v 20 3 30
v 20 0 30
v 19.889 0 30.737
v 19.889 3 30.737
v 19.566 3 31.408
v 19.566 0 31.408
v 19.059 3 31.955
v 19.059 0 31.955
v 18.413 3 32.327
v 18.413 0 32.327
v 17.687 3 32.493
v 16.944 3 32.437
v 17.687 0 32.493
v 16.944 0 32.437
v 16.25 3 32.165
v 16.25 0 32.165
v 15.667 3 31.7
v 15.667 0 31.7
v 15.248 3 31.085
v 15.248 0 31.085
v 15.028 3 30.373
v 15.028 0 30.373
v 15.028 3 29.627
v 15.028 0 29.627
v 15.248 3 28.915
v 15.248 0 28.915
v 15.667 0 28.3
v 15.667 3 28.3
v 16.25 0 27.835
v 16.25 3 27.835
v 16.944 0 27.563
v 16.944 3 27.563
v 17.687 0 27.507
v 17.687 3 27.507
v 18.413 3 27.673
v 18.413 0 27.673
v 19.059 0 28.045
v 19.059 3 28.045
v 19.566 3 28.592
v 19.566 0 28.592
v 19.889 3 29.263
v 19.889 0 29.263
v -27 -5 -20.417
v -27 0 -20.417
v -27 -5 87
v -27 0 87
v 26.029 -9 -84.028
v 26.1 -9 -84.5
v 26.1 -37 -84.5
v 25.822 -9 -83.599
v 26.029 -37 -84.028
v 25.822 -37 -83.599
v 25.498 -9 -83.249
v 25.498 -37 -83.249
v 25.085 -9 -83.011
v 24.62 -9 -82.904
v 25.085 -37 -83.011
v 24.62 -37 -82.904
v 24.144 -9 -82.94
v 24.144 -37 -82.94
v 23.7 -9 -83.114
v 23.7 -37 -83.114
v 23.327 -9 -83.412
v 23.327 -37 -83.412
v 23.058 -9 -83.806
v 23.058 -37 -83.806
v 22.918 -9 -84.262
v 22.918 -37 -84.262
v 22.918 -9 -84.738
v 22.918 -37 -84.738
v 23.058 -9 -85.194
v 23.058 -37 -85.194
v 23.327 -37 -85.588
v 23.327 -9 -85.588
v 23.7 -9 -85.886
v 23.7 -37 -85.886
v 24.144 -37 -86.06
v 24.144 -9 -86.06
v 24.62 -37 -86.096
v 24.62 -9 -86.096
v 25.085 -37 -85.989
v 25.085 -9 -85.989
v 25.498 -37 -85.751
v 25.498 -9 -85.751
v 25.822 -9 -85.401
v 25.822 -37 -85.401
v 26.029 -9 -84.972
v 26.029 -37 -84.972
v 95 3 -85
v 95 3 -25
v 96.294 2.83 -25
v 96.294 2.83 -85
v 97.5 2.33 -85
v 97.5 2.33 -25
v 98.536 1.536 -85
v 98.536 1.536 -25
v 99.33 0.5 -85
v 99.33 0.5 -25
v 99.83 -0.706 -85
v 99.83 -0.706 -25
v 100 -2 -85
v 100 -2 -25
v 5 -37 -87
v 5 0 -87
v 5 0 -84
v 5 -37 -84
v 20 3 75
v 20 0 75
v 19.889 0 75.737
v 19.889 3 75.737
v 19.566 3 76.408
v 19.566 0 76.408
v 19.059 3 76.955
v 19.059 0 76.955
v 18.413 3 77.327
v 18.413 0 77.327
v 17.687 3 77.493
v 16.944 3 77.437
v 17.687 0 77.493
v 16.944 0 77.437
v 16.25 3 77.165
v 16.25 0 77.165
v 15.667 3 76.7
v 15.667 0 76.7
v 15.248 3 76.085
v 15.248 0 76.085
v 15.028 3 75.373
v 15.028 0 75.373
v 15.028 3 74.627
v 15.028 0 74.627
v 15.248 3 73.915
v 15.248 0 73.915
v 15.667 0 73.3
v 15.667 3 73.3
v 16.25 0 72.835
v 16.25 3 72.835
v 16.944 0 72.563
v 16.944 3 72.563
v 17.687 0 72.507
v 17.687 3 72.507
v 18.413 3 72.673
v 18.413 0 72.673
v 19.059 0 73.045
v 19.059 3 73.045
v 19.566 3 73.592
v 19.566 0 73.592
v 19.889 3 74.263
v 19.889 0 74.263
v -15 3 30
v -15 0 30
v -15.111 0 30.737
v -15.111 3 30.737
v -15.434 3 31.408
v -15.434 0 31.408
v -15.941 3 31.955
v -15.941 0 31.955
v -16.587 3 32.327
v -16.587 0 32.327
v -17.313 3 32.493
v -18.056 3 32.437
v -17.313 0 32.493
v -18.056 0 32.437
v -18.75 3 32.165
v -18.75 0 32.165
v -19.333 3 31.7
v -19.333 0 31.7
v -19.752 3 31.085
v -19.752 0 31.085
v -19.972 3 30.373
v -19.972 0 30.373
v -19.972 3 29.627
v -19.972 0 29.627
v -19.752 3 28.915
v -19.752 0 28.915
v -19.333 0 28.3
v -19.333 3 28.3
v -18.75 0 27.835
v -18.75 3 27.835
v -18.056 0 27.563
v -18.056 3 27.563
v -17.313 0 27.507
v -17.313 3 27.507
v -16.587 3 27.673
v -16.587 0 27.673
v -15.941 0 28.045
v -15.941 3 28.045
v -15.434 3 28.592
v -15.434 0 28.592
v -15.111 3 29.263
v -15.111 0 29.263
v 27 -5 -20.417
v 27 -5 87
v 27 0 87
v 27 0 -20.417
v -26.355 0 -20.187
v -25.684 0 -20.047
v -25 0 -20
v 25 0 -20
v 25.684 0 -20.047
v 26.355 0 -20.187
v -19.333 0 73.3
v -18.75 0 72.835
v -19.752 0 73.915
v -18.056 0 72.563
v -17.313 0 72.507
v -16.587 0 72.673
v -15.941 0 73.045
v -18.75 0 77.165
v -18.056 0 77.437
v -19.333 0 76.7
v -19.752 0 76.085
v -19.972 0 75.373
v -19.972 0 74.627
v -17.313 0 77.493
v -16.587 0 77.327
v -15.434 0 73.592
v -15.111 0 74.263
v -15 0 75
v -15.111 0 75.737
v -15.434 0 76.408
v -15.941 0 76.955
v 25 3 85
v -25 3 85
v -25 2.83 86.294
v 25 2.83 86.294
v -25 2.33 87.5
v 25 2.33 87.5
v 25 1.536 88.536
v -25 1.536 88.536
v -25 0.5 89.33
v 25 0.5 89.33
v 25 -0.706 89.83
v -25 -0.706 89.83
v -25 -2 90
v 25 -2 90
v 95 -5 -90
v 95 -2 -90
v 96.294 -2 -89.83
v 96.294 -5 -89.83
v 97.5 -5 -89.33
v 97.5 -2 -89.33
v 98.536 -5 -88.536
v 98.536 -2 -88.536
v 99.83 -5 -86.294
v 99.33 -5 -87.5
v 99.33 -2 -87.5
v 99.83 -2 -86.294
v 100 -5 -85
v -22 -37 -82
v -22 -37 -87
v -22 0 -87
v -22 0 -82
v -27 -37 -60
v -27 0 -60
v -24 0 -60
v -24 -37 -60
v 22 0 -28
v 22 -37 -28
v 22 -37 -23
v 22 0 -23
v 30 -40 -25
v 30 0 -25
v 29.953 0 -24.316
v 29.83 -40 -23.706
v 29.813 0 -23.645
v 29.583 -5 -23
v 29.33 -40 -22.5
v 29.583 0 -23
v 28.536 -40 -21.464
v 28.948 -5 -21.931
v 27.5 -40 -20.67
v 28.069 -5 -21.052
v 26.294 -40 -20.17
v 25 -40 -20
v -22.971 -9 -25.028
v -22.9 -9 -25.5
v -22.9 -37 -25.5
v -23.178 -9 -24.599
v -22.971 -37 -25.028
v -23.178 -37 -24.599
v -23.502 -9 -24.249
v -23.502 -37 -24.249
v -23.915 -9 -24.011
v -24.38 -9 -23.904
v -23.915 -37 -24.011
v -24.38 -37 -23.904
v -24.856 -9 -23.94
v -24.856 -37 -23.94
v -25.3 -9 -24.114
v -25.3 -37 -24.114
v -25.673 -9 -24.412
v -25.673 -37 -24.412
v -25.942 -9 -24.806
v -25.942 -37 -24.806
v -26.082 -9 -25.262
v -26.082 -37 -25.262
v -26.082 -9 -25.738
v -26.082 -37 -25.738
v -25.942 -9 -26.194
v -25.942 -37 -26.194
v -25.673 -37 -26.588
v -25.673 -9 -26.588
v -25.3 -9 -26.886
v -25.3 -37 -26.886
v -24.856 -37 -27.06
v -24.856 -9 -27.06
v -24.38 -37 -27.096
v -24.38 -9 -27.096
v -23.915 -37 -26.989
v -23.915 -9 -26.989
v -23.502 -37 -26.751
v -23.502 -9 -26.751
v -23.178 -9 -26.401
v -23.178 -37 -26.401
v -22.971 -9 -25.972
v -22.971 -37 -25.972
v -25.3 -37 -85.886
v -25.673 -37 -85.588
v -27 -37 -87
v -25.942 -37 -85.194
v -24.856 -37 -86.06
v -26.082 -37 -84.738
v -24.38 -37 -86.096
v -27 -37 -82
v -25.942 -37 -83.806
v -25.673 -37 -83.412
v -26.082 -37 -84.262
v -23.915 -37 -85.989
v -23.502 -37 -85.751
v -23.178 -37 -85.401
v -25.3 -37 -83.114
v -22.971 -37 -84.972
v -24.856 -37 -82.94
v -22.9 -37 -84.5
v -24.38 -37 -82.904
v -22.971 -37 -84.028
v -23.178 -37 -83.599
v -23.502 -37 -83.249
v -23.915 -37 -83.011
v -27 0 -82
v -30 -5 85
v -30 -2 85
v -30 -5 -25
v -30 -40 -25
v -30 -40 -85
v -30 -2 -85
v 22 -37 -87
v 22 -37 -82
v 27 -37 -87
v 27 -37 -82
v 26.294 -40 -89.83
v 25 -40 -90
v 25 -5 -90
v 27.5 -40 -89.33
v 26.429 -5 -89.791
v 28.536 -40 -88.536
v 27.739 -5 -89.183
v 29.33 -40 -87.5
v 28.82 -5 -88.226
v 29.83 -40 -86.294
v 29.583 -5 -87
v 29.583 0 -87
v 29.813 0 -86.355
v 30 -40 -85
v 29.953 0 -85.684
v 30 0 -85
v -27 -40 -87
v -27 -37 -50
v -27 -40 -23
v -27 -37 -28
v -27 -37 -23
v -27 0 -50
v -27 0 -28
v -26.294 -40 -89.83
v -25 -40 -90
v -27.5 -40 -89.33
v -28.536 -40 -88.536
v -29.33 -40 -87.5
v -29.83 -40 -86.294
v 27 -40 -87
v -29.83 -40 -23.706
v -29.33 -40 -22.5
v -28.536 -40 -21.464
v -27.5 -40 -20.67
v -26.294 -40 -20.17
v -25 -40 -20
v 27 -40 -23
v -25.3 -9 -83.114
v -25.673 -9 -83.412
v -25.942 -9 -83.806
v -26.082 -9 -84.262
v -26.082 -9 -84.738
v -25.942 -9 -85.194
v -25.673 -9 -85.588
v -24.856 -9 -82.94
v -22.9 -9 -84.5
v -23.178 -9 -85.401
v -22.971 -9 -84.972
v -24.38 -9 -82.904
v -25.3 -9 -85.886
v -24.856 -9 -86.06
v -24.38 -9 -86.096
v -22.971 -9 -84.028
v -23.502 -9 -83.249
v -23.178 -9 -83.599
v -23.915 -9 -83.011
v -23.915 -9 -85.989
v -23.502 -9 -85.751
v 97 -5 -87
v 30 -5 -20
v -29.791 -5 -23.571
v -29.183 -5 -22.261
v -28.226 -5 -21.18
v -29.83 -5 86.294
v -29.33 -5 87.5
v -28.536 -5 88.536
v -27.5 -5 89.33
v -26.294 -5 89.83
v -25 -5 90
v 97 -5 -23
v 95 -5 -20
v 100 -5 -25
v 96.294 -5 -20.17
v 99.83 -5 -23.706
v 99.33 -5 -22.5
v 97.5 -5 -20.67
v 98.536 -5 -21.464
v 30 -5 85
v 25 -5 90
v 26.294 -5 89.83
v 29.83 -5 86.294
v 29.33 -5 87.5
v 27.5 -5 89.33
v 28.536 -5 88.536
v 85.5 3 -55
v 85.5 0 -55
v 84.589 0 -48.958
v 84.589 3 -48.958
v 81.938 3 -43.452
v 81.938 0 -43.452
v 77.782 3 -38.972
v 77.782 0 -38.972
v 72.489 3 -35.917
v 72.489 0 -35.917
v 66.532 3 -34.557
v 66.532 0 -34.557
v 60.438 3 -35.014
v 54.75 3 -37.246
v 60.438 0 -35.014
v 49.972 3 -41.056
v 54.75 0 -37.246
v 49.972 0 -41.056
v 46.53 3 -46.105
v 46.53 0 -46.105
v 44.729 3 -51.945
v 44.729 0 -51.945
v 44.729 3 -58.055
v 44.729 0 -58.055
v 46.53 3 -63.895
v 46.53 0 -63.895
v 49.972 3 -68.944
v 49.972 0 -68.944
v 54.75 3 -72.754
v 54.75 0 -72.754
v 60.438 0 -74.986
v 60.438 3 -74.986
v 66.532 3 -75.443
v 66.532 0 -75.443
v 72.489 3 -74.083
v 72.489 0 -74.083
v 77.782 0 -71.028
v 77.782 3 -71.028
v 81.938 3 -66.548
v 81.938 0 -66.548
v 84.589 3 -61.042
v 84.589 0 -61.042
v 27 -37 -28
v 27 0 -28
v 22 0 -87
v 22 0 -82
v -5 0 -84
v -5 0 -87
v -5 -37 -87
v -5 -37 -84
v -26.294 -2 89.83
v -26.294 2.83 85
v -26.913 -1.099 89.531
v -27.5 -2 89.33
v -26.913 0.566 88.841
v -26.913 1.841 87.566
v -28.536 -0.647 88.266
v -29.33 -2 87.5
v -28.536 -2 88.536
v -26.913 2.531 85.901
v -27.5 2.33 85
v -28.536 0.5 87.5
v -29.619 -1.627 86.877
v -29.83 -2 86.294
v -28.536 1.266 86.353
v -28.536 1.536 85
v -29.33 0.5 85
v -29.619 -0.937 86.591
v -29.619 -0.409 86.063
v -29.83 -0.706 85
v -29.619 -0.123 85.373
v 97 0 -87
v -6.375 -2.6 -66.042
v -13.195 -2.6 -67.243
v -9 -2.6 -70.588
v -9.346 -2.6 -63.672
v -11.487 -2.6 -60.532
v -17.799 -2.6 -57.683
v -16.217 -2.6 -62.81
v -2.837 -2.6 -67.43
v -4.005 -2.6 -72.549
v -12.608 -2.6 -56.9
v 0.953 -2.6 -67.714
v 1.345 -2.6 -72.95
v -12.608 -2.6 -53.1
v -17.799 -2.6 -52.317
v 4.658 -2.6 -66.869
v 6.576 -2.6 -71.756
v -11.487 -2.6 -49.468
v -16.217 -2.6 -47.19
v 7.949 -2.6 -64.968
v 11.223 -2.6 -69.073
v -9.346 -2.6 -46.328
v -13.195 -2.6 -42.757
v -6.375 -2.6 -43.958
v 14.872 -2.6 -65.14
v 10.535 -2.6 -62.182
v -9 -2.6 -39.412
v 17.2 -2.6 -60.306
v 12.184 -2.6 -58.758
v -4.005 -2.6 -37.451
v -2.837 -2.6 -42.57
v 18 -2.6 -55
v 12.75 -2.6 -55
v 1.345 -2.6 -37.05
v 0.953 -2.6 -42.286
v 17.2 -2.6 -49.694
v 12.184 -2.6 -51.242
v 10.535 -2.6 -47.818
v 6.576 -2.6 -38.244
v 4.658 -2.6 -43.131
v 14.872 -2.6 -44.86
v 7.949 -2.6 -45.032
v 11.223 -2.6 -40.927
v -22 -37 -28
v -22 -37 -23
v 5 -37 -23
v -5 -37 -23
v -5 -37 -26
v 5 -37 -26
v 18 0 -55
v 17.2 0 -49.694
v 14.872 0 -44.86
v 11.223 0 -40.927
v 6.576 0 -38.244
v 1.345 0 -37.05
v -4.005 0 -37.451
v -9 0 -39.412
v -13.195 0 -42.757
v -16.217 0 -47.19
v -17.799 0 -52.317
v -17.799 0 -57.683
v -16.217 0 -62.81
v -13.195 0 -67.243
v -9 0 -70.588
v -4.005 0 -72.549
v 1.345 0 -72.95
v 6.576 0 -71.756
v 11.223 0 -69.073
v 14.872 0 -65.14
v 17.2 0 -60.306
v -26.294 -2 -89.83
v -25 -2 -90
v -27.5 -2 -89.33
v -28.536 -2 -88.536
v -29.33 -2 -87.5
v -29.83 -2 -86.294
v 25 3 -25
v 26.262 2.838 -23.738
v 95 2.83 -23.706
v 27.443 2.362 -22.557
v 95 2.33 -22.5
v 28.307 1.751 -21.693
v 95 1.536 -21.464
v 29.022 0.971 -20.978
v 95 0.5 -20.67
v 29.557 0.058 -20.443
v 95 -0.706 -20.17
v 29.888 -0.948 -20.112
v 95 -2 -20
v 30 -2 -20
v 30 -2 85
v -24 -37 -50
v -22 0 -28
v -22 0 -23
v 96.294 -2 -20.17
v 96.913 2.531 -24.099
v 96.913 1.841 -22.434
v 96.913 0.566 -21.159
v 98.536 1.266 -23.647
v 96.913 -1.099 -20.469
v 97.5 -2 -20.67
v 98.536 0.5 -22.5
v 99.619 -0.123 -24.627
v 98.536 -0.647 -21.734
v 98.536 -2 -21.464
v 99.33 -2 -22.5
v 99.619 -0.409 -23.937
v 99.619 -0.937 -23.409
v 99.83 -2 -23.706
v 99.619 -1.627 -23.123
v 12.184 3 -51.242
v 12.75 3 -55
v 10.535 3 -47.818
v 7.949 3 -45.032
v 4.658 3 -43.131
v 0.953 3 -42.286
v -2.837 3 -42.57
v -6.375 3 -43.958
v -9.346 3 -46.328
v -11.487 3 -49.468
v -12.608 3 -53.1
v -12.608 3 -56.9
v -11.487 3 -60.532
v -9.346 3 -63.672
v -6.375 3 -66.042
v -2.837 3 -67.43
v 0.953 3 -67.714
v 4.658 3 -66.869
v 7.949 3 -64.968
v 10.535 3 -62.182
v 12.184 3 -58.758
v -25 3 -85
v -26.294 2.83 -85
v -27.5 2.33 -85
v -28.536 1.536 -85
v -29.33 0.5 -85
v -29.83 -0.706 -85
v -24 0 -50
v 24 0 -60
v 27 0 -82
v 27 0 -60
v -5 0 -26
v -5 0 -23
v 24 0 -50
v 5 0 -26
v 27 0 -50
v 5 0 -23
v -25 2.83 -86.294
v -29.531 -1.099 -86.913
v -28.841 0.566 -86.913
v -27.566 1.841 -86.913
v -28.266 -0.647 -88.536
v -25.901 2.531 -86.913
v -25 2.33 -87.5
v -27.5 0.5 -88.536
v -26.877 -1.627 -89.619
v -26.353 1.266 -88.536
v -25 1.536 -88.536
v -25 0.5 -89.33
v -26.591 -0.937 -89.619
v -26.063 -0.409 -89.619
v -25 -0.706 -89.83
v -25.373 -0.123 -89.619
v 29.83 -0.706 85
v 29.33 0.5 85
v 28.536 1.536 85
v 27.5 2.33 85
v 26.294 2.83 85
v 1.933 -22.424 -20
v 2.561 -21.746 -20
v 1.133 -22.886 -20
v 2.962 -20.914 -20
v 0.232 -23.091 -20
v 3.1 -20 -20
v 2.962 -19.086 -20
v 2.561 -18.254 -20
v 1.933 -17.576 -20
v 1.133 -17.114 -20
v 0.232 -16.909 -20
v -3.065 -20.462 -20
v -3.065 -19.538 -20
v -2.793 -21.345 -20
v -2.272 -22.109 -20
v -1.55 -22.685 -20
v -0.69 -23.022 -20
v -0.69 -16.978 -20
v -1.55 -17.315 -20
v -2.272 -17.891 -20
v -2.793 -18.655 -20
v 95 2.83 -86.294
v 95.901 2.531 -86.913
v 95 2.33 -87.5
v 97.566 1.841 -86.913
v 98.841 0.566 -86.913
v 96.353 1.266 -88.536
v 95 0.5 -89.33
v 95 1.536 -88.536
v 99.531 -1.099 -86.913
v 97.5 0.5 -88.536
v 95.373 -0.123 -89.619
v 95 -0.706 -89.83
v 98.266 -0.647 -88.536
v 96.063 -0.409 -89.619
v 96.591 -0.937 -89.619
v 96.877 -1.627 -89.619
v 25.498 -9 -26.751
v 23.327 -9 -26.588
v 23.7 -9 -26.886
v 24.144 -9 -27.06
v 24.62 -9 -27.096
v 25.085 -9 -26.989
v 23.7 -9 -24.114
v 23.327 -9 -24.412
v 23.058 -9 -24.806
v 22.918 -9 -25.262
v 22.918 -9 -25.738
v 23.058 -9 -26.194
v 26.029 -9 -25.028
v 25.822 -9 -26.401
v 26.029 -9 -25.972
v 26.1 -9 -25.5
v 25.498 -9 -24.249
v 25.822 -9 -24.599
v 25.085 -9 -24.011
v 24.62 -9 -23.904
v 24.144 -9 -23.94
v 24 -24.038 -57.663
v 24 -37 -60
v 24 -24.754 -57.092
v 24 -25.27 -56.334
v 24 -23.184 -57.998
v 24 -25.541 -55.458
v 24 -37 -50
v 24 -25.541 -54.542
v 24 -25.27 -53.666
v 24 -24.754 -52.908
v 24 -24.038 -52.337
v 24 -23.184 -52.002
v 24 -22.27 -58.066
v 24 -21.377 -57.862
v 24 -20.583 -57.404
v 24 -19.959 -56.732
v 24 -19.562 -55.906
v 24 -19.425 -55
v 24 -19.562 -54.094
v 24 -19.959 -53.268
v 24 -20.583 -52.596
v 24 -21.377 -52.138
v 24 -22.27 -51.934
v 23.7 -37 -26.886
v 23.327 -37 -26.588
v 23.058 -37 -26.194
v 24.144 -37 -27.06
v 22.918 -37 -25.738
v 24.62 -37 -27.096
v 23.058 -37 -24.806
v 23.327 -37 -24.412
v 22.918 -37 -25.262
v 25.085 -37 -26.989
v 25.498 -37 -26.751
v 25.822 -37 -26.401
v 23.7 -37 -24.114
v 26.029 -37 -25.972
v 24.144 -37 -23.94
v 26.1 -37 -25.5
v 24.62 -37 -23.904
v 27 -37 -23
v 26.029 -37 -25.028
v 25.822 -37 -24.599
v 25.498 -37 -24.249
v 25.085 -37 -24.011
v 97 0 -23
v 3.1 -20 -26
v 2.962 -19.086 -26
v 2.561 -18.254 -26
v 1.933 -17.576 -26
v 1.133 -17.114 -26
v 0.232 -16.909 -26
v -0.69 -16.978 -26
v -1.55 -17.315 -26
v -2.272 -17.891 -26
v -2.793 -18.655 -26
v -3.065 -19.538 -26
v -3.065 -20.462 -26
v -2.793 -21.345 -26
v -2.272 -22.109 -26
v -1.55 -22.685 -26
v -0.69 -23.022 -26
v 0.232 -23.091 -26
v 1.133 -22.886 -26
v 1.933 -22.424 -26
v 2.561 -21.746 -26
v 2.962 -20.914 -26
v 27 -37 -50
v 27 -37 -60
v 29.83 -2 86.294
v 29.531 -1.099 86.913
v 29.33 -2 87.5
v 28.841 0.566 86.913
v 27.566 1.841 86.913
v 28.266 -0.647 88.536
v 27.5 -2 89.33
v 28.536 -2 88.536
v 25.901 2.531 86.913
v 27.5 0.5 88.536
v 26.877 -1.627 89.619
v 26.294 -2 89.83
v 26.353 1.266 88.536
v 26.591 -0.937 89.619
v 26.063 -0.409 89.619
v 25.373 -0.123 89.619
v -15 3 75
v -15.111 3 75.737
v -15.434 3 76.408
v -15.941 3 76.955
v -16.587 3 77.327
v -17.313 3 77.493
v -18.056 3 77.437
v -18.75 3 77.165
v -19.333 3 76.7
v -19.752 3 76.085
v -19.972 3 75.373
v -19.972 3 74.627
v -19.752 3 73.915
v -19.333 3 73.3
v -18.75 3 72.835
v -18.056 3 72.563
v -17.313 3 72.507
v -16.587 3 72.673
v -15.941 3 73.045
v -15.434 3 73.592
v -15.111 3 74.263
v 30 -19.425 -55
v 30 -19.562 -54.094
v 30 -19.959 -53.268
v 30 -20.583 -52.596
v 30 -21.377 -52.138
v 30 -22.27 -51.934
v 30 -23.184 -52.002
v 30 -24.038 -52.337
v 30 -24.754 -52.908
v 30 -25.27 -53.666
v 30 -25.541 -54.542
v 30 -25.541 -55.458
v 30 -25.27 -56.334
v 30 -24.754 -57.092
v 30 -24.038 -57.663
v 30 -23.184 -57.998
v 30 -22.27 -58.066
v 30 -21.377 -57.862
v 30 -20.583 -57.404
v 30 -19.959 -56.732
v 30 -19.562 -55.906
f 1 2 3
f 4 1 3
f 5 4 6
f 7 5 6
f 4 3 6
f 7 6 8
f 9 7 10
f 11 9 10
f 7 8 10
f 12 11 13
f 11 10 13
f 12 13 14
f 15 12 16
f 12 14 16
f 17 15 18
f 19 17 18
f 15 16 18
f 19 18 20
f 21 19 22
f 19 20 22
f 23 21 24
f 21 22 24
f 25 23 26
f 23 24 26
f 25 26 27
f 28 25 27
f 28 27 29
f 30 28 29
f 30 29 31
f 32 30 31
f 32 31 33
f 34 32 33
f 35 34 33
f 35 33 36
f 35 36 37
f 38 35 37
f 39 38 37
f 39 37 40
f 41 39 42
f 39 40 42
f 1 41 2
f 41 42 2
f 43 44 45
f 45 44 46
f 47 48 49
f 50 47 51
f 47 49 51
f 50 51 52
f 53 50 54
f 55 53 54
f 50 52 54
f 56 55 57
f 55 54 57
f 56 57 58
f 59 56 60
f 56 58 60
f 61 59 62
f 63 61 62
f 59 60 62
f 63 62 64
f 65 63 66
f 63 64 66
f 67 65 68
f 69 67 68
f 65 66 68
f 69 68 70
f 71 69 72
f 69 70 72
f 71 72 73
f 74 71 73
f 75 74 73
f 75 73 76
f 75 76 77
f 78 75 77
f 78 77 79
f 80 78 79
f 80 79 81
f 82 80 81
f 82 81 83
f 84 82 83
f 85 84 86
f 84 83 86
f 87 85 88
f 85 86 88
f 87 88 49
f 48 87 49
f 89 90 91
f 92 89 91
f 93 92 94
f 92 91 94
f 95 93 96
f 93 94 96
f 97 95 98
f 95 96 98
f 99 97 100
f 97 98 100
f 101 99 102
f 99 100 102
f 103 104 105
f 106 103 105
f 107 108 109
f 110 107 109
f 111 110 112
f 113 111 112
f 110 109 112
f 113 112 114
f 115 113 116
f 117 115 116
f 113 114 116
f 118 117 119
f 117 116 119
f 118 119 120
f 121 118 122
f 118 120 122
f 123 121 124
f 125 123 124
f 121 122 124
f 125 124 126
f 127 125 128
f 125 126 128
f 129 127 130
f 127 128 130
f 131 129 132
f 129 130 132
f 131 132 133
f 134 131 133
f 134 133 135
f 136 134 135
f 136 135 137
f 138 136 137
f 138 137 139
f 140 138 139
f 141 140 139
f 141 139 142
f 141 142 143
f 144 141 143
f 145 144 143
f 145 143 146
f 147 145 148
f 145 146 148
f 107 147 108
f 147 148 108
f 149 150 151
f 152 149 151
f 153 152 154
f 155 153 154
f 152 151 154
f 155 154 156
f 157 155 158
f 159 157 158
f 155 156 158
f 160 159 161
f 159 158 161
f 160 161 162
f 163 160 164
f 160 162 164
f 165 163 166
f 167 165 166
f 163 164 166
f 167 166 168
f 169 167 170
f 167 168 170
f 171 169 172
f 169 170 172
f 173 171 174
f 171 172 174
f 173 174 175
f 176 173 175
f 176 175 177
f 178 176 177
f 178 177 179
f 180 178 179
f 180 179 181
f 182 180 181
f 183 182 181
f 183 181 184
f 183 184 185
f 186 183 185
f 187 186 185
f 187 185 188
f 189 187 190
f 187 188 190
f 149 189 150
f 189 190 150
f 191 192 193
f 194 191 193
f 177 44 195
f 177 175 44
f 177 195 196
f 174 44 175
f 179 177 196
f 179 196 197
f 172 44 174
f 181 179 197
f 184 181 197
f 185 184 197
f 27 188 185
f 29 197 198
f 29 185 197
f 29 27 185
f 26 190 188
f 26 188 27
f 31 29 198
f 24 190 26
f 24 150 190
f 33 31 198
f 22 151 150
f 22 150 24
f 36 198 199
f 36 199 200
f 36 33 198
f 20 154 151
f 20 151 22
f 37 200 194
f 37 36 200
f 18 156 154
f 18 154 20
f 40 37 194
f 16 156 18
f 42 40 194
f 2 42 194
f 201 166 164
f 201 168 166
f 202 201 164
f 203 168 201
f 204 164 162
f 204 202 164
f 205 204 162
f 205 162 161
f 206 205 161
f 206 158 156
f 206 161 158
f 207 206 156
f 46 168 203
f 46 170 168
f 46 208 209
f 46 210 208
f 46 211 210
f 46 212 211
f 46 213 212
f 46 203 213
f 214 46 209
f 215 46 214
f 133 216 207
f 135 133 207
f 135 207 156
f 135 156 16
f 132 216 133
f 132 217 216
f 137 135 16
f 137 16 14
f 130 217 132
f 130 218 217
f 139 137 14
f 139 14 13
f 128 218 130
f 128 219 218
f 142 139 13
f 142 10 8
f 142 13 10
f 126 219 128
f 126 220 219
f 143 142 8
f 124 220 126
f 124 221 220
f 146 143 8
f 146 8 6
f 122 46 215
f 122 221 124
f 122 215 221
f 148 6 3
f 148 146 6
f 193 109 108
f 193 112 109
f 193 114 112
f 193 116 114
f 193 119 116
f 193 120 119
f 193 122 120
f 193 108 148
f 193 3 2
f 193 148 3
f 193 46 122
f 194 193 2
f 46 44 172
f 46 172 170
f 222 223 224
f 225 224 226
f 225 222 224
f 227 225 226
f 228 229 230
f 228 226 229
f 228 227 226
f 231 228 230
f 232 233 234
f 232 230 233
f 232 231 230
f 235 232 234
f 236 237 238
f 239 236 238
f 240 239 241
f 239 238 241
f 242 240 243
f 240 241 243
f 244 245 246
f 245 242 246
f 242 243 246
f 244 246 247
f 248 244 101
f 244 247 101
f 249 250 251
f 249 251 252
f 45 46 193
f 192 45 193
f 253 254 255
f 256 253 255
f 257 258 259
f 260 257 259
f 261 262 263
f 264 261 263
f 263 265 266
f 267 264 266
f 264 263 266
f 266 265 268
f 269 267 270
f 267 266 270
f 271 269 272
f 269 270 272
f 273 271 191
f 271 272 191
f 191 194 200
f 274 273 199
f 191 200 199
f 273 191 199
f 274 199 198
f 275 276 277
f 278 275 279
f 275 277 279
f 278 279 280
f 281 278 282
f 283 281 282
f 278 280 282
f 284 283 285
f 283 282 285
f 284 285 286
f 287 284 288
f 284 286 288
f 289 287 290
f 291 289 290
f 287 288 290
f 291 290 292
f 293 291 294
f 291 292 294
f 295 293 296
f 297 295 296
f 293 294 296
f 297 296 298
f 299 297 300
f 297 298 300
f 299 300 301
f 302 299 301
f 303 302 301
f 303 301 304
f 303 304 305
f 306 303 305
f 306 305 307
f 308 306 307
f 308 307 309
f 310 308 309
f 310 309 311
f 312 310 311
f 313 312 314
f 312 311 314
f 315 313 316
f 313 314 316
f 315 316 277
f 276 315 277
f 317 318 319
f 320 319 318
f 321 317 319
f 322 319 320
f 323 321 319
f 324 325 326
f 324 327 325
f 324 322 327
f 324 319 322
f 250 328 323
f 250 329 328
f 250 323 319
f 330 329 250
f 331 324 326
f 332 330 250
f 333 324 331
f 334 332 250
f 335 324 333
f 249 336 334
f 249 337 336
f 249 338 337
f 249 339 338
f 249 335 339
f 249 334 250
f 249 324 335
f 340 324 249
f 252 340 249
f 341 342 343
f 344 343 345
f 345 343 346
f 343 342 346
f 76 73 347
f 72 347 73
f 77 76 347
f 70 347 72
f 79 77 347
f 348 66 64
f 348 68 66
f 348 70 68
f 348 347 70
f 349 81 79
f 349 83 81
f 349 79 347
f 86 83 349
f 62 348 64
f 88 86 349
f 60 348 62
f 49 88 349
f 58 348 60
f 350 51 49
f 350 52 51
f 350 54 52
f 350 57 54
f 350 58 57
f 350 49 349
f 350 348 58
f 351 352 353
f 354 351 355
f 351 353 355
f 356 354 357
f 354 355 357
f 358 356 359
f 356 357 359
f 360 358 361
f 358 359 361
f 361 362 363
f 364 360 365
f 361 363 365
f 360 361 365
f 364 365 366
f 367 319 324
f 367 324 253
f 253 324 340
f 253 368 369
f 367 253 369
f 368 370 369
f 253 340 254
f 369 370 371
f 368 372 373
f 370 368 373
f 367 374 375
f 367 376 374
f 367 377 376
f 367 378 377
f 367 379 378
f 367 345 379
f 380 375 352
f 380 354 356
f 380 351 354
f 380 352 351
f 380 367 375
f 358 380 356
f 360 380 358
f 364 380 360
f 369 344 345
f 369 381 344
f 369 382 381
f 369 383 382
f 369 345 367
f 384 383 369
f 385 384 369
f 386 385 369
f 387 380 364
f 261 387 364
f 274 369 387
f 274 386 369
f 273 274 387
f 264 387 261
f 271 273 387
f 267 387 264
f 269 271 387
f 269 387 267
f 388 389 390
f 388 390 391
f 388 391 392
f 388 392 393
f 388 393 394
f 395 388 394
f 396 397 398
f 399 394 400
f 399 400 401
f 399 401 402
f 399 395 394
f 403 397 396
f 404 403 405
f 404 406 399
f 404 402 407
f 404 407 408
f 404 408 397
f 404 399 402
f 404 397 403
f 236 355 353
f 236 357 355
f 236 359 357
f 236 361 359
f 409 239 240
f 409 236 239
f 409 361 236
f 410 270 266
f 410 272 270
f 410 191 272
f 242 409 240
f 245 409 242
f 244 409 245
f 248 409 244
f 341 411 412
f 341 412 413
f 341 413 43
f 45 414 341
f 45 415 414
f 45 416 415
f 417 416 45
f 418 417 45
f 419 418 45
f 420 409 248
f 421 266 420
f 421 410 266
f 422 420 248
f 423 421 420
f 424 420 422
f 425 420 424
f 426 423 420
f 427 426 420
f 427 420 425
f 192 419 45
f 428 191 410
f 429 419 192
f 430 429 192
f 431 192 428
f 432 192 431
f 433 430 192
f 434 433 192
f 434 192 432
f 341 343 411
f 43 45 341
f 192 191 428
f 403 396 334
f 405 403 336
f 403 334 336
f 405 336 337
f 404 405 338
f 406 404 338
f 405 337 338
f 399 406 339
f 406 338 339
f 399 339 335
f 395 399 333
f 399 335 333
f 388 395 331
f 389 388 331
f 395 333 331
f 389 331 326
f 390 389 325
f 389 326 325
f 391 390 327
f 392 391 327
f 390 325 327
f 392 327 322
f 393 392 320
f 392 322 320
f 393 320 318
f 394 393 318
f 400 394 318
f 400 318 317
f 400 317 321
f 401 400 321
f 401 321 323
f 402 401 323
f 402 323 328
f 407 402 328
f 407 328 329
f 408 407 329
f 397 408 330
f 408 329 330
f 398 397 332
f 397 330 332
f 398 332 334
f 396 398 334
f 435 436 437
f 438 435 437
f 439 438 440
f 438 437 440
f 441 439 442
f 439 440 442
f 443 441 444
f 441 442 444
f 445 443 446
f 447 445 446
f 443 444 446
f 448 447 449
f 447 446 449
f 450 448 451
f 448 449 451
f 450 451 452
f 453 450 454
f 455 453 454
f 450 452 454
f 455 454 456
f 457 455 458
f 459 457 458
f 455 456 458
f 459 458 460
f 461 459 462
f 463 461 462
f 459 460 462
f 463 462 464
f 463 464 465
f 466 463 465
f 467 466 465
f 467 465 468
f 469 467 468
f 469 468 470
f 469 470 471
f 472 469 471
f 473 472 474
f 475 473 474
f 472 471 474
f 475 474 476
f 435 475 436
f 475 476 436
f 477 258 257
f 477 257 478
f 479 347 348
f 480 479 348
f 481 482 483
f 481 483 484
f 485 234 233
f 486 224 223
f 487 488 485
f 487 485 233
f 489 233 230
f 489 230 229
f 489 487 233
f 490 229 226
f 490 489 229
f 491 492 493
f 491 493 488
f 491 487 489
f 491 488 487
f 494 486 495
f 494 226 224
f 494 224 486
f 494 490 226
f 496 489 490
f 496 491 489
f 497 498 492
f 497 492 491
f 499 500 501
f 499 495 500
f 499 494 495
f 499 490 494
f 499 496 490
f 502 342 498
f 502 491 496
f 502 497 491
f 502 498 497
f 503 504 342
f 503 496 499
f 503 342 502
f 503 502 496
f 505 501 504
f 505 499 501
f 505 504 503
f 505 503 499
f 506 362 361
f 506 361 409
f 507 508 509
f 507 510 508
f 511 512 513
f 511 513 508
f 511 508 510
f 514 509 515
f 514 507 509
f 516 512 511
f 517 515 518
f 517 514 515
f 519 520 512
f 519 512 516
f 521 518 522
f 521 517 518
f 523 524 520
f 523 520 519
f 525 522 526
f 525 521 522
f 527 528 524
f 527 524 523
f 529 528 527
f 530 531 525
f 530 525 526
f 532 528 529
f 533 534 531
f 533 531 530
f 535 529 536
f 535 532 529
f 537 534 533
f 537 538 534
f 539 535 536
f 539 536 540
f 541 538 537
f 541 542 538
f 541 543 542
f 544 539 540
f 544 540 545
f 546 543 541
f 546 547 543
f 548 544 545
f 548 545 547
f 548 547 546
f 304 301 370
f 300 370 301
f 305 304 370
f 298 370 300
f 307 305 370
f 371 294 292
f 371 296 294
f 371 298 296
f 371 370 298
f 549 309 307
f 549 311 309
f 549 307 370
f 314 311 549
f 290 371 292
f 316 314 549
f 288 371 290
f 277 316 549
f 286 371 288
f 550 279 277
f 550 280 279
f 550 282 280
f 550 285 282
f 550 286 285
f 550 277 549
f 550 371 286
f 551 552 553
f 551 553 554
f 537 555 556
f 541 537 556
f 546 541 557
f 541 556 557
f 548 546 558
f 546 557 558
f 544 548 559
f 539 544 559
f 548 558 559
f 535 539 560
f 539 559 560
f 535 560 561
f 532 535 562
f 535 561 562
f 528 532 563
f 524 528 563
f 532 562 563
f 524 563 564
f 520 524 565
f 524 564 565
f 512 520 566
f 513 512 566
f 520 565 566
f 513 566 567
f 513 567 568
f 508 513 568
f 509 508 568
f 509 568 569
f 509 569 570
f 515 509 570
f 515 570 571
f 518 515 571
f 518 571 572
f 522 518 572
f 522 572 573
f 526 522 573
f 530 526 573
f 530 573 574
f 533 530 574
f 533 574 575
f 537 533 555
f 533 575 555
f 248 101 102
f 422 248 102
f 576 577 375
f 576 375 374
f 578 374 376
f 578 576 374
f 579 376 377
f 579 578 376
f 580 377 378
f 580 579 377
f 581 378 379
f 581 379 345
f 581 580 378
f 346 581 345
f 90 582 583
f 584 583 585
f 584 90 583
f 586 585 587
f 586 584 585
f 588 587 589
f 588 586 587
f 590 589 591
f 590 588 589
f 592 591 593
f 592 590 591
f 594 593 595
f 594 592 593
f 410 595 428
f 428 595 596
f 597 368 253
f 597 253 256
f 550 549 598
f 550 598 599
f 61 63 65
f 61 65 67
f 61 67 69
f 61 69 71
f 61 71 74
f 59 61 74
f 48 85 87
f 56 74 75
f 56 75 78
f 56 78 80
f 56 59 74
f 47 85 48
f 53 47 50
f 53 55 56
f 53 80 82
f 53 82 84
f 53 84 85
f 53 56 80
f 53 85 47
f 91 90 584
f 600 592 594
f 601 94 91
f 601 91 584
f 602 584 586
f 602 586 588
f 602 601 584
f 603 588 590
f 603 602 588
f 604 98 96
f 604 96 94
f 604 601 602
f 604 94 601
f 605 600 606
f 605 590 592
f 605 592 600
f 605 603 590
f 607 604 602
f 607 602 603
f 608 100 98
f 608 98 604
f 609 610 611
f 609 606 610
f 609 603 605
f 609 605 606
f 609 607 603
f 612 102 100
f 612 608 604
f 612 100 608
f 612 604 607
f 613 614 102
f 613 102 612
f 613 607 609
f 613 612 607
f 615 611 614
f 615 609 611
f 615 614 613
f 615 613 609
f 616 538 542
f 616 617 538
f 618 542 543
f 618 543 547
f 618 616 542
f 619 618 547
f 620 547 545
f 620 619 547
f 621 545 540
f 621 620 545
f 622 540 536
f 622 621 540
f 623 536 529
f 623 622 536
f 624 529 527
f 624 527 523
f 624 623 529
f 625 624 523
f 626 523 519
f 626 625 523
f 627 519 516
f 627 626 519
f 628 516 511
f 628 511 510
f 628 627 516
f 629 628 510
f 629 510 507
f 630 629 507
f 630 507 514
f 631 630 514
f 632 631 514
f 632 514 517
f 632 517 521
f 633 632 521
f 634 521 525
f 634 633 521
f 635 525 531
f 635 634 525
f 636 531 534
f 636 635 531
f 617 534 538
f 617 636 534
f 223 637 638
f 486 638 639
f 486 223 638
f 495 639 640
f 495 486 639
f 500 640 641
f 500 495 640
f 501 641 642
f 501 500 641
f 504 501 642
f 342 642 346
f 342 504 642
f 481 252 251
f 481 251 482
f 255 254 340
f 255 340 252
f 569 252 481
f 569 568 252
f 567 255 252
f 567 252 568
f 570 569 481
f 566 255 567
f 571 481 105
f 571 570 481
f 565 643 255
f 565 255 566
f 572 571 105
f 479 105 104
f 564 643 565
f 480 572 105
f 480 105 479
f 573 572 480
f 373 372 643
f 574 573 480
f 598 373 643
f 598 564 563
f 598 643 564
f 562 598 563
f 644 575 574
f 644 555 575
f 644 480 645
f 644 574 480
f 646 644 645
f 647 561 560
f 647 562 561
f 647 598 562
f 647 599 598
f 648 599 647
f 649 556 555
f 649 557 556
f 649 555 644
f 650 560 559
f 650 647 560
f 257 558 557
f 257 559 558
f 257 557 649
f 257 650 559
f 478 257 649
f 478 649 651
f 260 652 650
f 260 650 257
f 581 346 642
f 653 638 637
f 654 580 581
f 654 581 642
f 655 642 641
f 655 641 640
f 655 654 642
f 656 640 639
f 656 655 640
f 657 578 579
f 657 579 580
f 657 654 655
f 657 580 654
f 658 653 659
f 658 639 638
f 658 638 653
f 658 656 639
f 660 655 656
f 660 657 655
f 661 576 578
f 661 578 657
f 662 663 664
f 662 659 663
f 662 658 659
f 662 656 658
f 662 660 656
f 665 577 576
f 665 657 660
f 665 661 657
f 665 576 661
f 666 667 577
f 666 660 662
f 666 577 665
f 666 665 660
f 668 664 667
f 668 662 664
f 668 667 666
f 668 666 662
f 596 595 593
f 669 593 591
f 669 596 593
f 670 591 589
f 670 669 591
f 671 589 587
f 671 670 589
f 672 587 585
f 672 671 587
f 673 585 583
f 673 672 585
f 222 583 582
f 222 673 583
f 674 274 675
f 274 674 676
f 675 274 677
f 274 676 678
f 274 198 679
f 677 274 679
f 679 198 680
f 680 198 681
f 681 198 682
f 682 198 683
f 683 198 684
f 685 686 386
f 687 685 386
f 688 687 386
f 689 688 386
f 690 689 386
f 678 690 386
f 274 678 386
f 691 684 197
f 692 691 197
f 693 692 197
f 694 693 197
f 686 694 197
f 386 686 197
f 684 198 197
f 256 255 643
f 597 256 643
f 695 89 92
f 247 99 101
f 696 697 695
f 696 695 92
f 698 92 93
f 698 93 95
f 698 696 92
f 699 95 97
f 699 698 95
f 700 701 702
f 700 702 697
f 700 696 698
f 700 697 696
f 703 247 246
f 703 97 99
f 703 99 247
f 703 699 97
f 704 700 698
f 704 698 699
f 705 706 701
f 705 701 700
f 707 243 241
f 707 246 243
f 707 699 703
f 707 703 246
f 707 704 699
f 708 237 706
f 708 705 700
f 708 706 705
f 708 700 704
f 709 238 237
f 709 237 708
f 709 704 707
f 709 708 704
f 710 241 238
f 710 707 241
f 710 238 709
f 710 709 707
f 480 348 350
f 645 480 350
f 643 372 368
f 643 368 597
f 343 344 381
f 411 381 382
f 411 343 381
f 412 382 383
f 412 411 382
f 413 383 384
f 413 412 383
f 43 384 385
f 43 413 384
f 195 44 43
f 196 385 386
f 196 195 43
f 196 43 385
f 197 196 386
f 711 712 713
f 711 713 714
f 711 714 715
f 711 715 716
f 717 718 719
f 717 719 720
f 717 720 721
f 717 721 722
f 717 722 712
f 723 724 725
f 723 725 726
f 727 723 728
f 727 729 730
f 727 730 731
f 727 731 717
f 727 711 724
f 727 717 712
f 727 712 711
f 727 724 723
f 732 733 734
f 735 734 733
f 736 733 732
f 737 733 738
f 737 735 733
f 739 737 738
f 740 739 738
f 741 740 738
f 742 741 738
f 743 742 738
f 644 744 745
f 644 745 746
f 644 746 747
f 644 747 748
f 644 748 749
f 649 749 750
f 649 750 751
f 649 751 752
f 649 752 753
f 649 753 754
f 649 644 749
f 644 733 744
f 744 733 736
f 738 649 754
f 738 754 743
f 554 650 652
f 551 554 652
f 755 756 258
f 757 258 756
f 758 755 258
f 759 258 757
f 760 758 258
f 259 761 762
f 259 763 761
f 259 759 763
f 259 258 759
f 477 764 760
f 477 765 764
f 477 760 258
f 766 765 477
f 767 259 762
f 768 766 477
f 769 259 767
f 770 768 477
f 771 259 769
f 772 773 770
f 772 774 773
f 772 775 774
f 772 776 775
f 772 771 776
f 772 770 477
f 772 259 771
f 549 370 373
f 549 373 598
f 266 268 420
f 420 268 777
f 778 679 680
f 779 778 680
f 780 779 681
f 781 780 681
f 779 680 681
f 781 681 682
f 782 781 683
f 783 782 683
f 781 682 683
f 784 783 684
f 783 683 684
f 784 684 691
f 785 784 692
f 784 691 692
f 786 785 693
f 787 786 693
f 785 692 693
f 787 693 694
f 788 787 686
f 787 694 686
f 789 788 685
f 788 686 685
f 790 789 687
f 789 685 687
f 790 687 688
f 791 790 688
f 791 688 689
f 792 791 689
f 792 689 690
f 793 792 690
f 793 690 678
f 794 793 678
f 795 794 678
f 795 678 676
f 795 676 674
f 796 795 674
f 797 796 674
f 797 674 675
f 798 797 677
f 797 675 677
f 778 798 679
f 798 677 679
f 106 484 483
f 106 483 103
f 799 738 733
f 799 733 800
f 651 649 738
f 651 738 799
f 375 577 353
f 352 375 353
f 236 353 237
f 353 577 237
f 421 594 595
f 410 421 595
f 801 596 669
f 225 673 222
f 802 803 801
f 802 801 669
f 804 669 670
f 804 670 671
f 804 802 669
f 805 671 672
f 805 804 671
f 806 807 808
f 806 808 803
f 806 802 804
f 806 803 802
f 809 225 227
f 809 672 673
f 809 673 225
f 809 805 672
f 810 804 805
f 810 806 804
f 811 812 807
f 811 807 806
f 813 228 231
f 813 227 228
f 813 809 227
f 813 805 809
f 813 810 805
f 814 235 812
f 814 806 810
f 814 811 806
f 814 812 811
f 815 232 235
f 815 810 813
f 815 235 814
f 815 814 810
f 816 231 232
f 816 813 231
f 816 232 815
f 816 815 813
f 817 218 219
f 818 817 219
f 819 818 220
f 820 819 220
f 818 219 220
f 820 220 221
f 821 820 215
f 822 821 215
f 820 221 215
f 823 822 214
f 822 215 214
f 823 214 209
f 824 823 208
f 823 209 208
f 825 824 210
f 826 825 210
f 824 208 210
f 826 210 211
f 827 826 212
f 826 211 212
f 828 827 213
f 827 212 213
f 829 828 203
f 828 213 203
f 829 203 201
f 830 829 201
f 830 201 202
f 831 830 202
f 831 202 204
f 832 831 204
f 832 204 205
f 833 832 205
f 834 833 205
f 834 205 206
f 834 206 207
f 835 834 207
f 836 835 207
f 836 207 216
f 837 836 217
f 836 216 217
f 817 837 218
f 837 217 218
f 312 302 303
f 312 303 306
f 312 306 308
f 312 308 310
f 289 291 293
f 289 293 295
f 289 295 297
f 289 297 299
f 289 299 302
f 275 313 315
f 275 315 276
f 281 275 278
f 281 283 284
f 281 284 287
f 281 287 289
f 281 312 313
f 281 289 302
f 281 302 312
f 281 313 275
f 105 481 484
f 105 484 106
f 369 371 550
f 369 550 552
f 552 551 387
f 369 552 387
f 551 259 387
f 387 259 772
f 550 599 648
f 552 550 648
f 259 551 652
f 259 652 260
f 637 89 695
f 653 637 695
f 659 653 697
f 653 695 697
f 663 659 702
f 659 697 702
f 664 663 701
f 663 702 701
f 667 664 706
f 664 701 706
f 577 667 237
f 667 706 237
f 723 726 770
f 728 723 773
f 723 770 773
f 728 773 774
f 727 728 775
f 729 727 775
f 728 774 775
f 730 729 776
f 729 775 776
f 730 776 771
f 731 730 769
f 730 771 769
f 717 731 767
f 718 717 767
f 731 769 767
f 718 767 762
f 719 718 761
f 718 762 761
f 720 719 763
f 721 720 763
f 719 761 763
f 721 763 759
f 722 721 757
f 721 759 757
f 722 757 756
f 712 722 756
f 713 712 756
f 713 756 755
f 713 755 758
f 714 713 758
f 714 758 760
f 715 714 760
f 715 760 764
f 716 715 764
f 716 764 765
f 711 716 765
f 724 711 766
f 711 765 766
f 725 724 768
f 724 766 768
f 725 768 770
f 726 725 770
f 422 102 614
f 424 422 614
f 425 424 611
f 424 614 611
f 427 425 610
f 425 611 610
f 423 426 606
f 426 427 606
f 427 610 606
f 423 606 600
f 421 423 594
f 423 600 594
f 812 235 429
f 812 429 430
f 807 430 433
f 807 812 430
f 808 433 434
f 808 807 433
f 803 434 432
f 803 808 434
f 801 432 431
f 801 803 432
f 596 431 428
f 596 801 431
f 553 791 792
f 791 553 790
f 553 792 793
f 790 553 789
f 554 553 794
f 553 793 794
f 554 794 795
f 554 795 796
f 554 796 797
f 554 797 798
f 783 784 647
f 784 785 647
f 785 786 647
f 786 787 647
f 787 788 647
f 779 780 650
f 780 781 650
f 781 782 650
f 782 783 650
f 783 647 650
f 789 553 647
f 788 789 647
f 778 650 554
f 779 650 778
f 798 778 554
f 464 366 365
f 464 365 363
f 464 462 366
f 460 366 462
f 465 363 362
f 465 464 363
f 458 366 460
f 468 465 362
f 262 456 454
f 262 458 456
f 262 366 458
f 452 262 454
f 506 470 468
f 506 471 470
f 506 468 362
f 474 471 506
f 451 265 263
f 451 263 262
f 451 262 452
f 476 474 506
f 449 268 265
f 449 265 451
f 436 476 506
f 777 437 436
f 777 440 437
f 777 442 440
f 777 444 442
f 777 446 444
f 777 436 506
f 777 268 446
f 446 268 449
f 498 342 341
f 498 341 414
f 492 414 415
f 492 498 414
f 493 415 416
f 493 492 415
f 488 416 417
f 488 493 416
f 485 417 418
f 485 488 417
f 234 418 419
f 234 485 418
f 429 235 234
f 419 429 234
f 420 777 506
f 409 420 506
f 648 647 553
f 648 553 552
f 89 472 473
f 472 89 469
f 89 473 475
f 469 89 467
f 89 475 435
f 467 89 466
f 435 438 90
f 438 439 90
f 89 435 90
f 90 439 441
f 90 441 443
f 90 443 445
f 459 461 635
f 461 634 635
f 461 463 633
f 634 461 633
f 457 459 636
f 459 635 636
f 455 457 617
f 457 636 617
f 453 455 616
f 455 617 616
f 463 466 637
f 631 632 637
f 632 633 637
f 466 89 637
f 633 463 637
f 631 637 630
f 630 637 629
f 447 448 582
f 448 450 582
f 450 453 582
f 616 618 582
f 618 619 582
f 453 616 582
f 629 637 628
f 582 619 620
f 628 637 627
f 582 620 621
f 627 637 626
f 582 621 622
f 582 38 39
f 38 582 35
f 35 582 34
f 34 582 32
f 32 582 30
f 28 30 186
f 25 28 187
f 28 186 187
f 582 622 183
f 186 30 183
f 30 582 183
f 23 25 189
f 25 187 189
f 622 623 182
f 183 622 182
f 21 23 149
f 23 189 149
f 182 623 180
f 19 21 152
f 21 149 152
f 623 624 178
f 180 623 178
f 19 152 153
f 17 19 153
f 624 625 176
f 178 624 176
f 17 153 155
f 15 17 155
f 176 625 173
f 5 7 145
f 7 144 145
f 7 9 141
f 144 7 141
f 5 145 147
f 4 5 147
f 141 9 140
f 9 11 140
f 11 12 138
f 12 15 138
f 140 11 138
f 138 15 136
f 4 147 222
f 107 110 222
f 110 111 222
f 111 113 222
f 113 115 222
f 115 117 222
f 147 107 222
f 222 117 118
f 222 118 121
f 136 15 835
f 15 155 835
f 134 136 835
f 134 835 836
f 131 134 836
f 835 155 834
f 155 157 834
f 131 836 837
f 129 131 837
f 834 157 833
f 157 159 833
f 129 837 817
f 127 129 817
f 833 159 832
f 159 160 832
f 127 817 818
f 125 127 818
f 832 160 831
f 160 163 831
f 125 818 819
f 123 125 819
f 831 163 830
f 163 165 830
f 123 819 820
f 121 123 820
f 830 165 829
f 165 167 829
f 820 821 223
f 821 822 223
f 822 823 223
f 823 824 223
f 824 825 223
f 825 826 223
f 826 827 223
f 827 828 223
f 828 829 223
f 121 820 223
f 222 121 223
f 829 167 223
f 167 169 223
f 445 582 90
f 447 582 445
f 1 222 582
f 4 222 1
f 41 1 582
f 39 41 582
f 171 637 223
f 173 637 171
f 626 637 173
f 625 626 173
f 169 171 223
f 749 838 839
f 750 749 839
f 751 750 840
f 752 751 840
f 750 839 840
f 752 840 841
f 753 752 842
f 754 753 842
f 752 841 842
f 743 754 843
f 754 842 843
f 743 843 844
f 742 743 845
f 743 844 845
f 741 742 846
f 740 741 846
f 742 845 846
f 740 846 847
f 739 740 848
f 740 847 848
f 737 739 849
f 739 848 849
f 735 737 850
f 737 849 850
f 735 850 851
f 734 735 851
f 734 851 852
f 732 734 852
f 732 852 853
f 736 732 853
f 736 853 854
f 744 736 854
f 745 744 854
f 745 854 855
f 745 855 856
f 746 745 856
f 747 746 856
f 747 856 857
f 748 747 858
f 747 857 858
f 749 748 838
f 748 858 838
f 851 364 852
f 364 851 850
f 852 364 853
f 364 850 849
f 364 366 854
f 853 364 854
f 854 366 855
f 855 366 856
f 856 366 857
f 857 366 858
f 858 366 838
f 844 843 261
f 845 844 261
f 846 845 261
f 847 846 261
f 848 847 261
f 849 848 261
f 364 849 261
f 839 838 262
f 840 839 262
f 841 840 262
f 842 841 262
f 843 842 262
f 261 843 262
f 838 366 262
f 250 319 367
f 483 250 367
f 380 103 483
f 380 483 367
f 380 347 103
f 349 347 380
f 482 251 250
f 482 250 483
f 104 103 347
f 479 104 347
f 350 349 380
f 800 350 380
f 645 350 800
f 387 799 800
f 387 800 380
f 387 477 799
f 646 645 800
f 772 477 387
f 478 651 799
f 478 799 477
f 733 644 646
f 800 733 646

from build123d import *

# Parameters (mm, degrees)
F0_W          = 60
F0_H          = 180
F0_R          = 12.75
F0_R_2        = 2.5
F1_DEPTH      = 3
F2_R          = 18
F2_R_2        = 12.75
F3_DEPTH      = 2.6
F4_W          = 60
F4_H          = 70
F4_W_2        = 54
F4_H_2        = 64
F5_DEPTH      = 40
F6_W          = 5
F6_H          = 5
F6_W_2        = 10
F6_H_2        = 3
F6_W_3        = 3
F6_H_3        = 10
F7_DEPTH      = 37
F8_R          = 1.6
F9_DEPTH      = 28
F10_W         = 3
F10_H         = 70
F11_DEPTH     = 70
F13_R         = 20.5
F14_DEPTH     = 3
F16_DEPTH     = 5
F17_R         = 3.075
F18_DEPTH     = 6
F19_R         = 3.1
F20_DEPTH     = 6
F22_DEPTH     = 5
F23_R         = 5
F24_T1_DEPTH  = 47.5
F24_T3_DEPTH  = 50.5
F24_T5_DEPTH  = 15.5
F24_S9_W      = 5.1
F24_S9_H      = 5.1
F24_T10_DEPTH = 5.1
F24_S15_W     = 5.1
F24_S15_H     = 5.1
F24_T16_DEPTH = 5.1
F24_S21_W     = 5.1
F24_S21_H     = 5.1
F24_T22_DEPTH = 5.1
F24_S27_W     = 5.1
F24_S27_H     = 5.1
F24_T28_DEPTH = 5.1
F24_S33_W     = 5.1
F24_S33_H     = 5.1
F24_T34_DEPTH = 5.1
F24_T40_DEPTH = 60
F24_T46_DEPTH = 60
F24_T52_DEPTH = 60
F24_T58_DEPTH = 60


# Not quite as in the source:
# - a fillet or chamfer that OpenCascade refuses, or shapes differently, is made with other operations: its cross-section is extruded or revolved along the edge and cut away or added


with BuildPart() as f1:
    # F0 (on Front) → F1 (new body)
    with BuildSketch(Plane.XZ):
        Rectangle(F0_W, F0_H)
        with Locations((0, -55)):
            Circle(F0_R, mode=Mode.SUBTRACT)
        with Locations((-17.5, 30)):
            Circle(F0_R_2, mode=Mode.SUBTRACT)
        with Locations((-17.5, 75)):
            Circle(F0_R_2, mode=Mode.SUBTRACT)
        with Locations((17.5, 30)):
            Circle(F0_R_2, mode=Mode.SUBTRACT)
        with Locations((17.5, 75)):
            Circle(F0_R_2, mode=Mode.SUBTRACT)
    extrude(amount=-F1_DEPTH)

    # F2 (on face) → F3 (join)
    with BuildSketch(Plane.XZ):
        with Locations((0, -55)):
            Circle(F2_R)
        with Locations((0, -55)):
            Circle(F2_R_2, mode=Mode.SUBTRACT)
    extrude(amount=F3_DEPTH)

    # F4 (on face) → F5 (join)
    with BuildSketch(Plane.XZ):
        with Locations((0, -55)):
            Rectangle(F4_W, F4_H)
        with Locations((0, -55)):
            Rectangle(F4_W_2, F4_H_2, mode=Mode.SUBTRACT)
    extrude(amount=F5_DEPTH)

    # F6 (on face) → F7 (join)
    with BuildSketch(Plane.XZ):
        with Locations((-24.5, -25.5)):
            Rectangle(F6_W, F6_H)
        with Locations((0, -24.5)):
            Rectangle(F6_W_2, F6_H_2)
        with Locations((24.5, -25.5)):
            Rectangle(F6_W, F6_H)
        with Locations((25.5, -55)):
            Rectangle(F6_W_3, F6_H_3)
        with Locations((-25.5, -55)):
            Rectangle(F6_W_3, F6_H_3)
        with Locations((24.5, -84.5)):
            Rectangle(F6_W, F6_H)
        with Locations((0, -85.5)):
            Rectangle(F6_W_2, F6_H_2)
        with Locations((-24.5, -84.5)):
            Rectangle(F6_W, F6_H)
    extrude(amount=F7_DEPTH)

    # F8 (on face) → F9 (cut)
    with BuildSketch(Plane.XZ.offset(37)):
        with Locations((24.5, -25.5)):
            Circle(F8_R)
        with Locations((-24.5, -25.5)):
            Circle(F8_R)
        with Locations((24.5, -84.5)):
            Circle(F8_R)
        with Locations((-24.5, -84.5)):
            Circle(F8_R)
    extrude(amount=-F9_DEPTH, mode=Mode.SUBTRACT)

    # F10 (on face) → F11 (join)
    with BuildSketch(Plane.YZ.offset(30)):
        with Locations((1.5, -55)):
            Rectangle(F10_W, F10_H)
    extrude(amount=F11_DEPTH)

    # F13 (on face) → F14 (cut, through all)
    with BuildSketch(Plane.XZ):
        with Locations((65, -55)):
            Circle(F13_R)
    extrude(amount=-F14_DEPTH, mode=Mode.SUBTRACT)

    # F15 (on face) → F16 (join)
    with BuildSketch(Plane.XZ):
        Polygon((100, -20), (30, -20), (30, -23), (97, -23), (97, -87), (30, -87), (30, -90), (100, -90), (100, -87), (100, -23), align=None)
    extrude(amount=F16_DEPTH)

    # F17 (on face) → F18 (cut, through all)
    with BuildSketch(Plane.YZ.offset(30)):
        with Locations((-22.5, -55)):
            Circle(F17_R)
    extrude(amount=-F18_DEPTH, mode=Mode.SUBTRACT)

    # F19 (on face) → F20 (cut, through all)
    with BuildSketch(Plane.XY.offset(-20)):
        with Locations((0, -20)):
            Circle(F19_R)
    extrude(amount=-F20_DEPTH, mode=Mode.SUBTRACT)

    # F21 (on face) → F22 (join)
    with BuildSketch(Plane.XZ):
        Polygon((30, -20), (30, 90), (27, 90), (21.6846410185, 90), (-27, 90), (-30, 90), (-30, -20), (-27, -20), (-27, 87), (27, 87), (27, -20), align=None)
    extrude(amount=F22_DEPTH)

    # F23
    f23_edges = [f1.edges().sort_by_distance(p)[0] for p in [
        (35, 3, -90),
        (-30, 3, 0),
        (0, 3, 90),
        (30, 3, 35),
        (65, 3, -20),
        (100, 3, -55),
    ]]
    fillet(f23_edges, radius=F23_R)

    # F24: fillet of radius 5 on 8 edges, made by hand

    # F24_s2 → F24_t1 (cut)
    with BuildSketch(Plane.XZ.offset(5)):
        with BuildLine():
            ThreePointArc((30, -25), (28.5355339059, -21.4644660941), (25, -20))
            Line((25, -20), (30, -20))
            Line((30, -20), (30, -25))
        make_face()
        with BuildLine():
            ThreePointArc((-30, -25), (-28.5355339059, -21.4644660941), (-25, -20))
            Line((-25, -20), (-30, -20))
            Line((-30, -20), (-30, -25))
        make_face()
        with BuildLine():
            ThreePointArc((25, -90), (28.5355339059, -88.5355339059), (30, -85))
            Line((30, -85), (30, -90))
            Line((30, -90), (25, -90))
        make_face()
    extrude(amount=F24_T1_DEPTH, mode=Mode.SUBTRACT)

    # F24_s4 → F24_t3 (cut)
    with BuildSketch(Plane.XZ.offset(2)):
        with BuildLine():
            ThreePointArc((-25, -90), (-28.5355339059, -88.5355339059), (-30, -85))
            Line((-30, -85), (-30, -90))
            Line((-30, -90), (-25, -90))
        make_face()
    extrude(amount=F24_T3_DEPTH, mode=Mode.SUBTRACT)

    # F24_s6 → F24_t5 (cut)
    with BuildSketch(Plane.XZ.offset(2)):
        with BuildLine():
            ThreePointArc((100, -25), (98.5355339059, -21.4644660941), (95, -20))
            Line((95, -20), (100, -20))
            Line((100, -20), (100, -25))
        make_face()
        with BuildLine():
            ThreePointArc((95, -90), (98.5355339059, -88.5355339059), (100, -85))
            Line((100, -85), (100, -90))
            Line((100, -90), (95, -90))
        make_face()
        with BuildLine():
            ThreePointArc((25, 90), (28.5355339059, 88.5355339059), (30, 85))
            Line((30, 85), (30, 90))
            Line((30, 90), (25, 90))
        make_face()
        with BuildLine():
            ThreePointArc((-30, 85), (-28.5355339059, 88.5355339059), (-25, 90))
            Line((-25, 90), (-30, 90))
            Line((-30, 90), (-30, 85))
        make_face()
    extrude(amount=F24_T5_DEPTH, mode=Mode.SUBTRACT)


with BuildPart() as f24_tool8:
    # F24_s9 → F24_t10 (new body)
    with BuildSketch(Plane.YZ.offset(-25)):
        with Locations((0.55, 87.55)):
            Rectangle(F24_S9_W, F24_S9_H)
    extrude(amount=-F24_T10_DEPTH)

    # F24_s11 → F24_t12 (revolve, cut)
    with BuildSketch(Plane(origin=(-25, -2, 85), x_dir=(0, -0.7071067812, -0.7071067812), z_dir=(0, 0.7071067812, -0.7071067812))):
        with BuildLine():
            ThreePointArc((0, -5), (5, 0), (0, 5))
            Line((0, 5), (0, -5))
        make_face()
    revolve(axis=Axis((-25, -2, 85), (-1, 0, 0)), mode=Mode.SUBTRACT)


with BuildPart() as f1_1:
    add(f1.part)

    # F24_t7: cut F24_tool8
    add(f24_tool8.part, mode=Mode.SUBTRACT)


with BuildPart() as f24_tool14:
    # F24_s15 → F24_t16 (new body)
    with BuildSketch(Plane.XY.offset(85)):
        with Locations((27.55, 0.55)):
            Rectangle(F24_S15_W, F24_S15_H)
    extrude(amount=F24_T16_DEPTH)

    # F24_s17 → F24_t18 (revolve, cut)
    with BuildSketch(Plane(origin=(25, -2, 85), x_dir=(-0.7071067812, -0.7071067812, 0), z_dir=(-0.7071067812, 0.7071067812, 0))):
        with BuildLine():
            ThreePointArc((0, -5), (5, 0), (0, 5))
            Line((0, 5), (0, -5))
        make_face()
    revolve(axis=Axis((25, -2, 85), (0, 0, 1)), mode=Mode.SUBTRACT)


with BuildPart() as f1_2:
    add(f1_1.part)

    # F24_t13: cut F24_tool14
    add(f24_tool14.part, mode=Mode.SUBTRACT)


with BuildPart() as f24_tool20:
    # F24_s21 → F24_t22 (new body)
    with BuildSketch(Plane.XY.offset(-85)):
        with Locations((97.55, 0.55)):
            Rectangle(F24_S21_W, F24_S21_H)
    extrude(amount=-F24_T22_DEPTH)

    # F24_s23 → F24_t24 (revolve, cut)
    with BuildSketch(Plane(origin=(95, -2, -85), x_dir=(-0.7071067812, -0.7071067812, 0), z_dir=(0.7071067812, -0.7071067812, 0))):
        with BuildLine():
            ThreePointArc((0, -5), (5, 0), (0, 5))
            Line((0, 5), (0, -5))
        make_face()
    revolve(axis=Axis((95, -2, -85), (0, 0, -1)), mode=Mode.SUBTRACT)


with BuildPart() as f1_3:
    add(f1_2.part)

    # F24_t19: cut F24_tool20
    add(f24_tool20.part, mode=Mode.SUBTRACT)


with BuildPart() as f24_tool26:
    # F24_s27 → F24_t28 (new body)
    with BuildSketch(Plane.YZ.offset(95)):
        with Locations((0.55, -22.45)):
            Rectangle(F24_S27_W, F24_S27_H)
    extrude(amount=F24_T28_DEPTH)

    # F24_s29 → F24_t30 (revolve, cut)
    with BuildSketch(Plane(origin=(95, -2, -25), x_dir=(0, -0.7071067812, -0.7071067812), z_dir=(0, -0.7071067812, 0.7071067812))):
        with BuildLine():
            ThreePointArc((0, -5), (5, 0), (0, 5))
            Line((0, 5), (0, -5))
        make_face()
    revolve(axis=Axis((95, -2, -25), (1, 0, 0)), mode=Mode.SUBTRACT)


with BuildPart() as f1_4:
    add(f1_3.part)

    # F24_t25: cut F24_tool26
    add(f24_tool26.part, mode=Mode.SUBTRACT)


with BuildPart() as f24_tool32:
    # F24_s33 → F24_t34 (new body)
    with BuildSketch(Plane.XY.offset(-85)):
        with Locations((-27.55, 0.55)):
            Rectangle(F24_S33_W, F24_S33_H)
    extrude(amount=-F24_T34_DEPTH)

    # F24_s35 → F24_t36 (revolve, cut)
    with BuildSketch(Plane(origin=(-25, -2, -85), x_dir=(0.7071067812, -0.7071067812, 0), z_dir=(0.7071067812, 0.7071067812, 0))):
        with BuildLine():
            ThreePointArc((0, -5), (5, 0), (0, 5))
            Line((0, 5), (0, -5))
        make_face()
    revolve(axis=Axis((-25, -2, -85), (0, 0, -1)), mode=Mode.SUBTRACT)


with BuildPart() as f1_5:
    add(f1_4.part)

    # F24_t31: cut F24_tool32
    add(f24_tool32.part, mode=Mode.SUBTRACT)


with BuildPart() as f24_tool38:
    # F24_s39 → F24_t40 (new body)
    with BuildSketch(Plane.XZ.offset(-7.5)):
        with BuildLine():
            ThreePointArc((30, -25), (28.5355339059, -21.4644660941), (25, -20))
            Line((25, -20), (30, -20))
            Line((30, -20), (30, -25))
        make_face()
    extrude(amount=F24_T40_DEPTH)

    split(bisect_by=Plane.XY.offset(-23), keep=Keep.BOTTOM)

    split(bisect_by=Plane.XZ, keep=Keep.TOP)


with BuildPart() as f1_6:
    add(f1_5.part)

    # F24_t37: cut F24_tool38
    add(f24_tool38.part, mode=Mode.SUBTRACT)


with BuildPart() as f24_tool44:
    # F24_s45 → F24_t46 (new body)
    with BuildSketch(Plane.XZ.offset(-7.5)):
        with BuildLine():
            ThreePointArc((30, -25), (28.5355339059, -21.4644660941), (25, -20))
            Line((25, -20), (30, -20))
            Line((30, -20), (30, -25))
        make_face()
    extrude(amount=F24_T46_DEPTH)

    split(bisect_by=Plane.XZ, keep=Keep.TOP)

    split(bisect_by=Plane.YZ.offset(27), keep=Keep.BOTTOM)


with BuildPart() as f1_7:
    add(f1_6.part)

    # F24_t43: cut F24_tool44
    add(f24_tool44.part, mode=Mode.SUBTRACT)


with BuildPart() as f24_tool50:
    # F24_s51 → F24_t52 (new body)
    with BuildSketch(Plane.XZ.offset(-7.5)):
        with BuildLine():
            ThreePointArc((-30, -25), (-28.5355339059, -21.4644660941), (-25, -20))
            Line((-25, -20), (-30, -20))
            Line((-30, -20), (-30, -25))
        make_face()
    extrude(amount=F24_T52_DEPTH)

    split(bisect_by=Plane.XZ, keep=Keep.TOP)

    split(bisect_by=Plane.YZ.offset(-27), keep=Keep.TOP)


with BuildPart() as f1_8:
    add(f1_7.part)

    # F24_t49: cut F24_tool50
    add(f24_tool50.part, mode=Mode.SUBTRACT)


with BuildPart() as f24_tool56:
    # F24_s57 → F24_t58 (new body)
    with BuildSketch(Plane.XZ.offset(-7.5)):
        with BuildLine():
            ThreePointArc((25, -90), (28.5355339059, -88.5355339059), (30, -85))
            Line((30, -85), (30, -90))
            Line((30, -90), (25, -90))
        make_face()
    extrude(amount=F24_T58_DEPTH)

    split(bisect_by=Plane.XY.offset(-87), keep=Keep.TOP)

    split(bisect_by=Plane.XZ, keep=Keep.TOP)


with BuildPart() as f1_9:
    add(f1_8.part)

    # F24_t55: cut F24_tool56
    add(f24_tool56.part, mode=Mode.SUBTRACT)


solid = f1_9.part
